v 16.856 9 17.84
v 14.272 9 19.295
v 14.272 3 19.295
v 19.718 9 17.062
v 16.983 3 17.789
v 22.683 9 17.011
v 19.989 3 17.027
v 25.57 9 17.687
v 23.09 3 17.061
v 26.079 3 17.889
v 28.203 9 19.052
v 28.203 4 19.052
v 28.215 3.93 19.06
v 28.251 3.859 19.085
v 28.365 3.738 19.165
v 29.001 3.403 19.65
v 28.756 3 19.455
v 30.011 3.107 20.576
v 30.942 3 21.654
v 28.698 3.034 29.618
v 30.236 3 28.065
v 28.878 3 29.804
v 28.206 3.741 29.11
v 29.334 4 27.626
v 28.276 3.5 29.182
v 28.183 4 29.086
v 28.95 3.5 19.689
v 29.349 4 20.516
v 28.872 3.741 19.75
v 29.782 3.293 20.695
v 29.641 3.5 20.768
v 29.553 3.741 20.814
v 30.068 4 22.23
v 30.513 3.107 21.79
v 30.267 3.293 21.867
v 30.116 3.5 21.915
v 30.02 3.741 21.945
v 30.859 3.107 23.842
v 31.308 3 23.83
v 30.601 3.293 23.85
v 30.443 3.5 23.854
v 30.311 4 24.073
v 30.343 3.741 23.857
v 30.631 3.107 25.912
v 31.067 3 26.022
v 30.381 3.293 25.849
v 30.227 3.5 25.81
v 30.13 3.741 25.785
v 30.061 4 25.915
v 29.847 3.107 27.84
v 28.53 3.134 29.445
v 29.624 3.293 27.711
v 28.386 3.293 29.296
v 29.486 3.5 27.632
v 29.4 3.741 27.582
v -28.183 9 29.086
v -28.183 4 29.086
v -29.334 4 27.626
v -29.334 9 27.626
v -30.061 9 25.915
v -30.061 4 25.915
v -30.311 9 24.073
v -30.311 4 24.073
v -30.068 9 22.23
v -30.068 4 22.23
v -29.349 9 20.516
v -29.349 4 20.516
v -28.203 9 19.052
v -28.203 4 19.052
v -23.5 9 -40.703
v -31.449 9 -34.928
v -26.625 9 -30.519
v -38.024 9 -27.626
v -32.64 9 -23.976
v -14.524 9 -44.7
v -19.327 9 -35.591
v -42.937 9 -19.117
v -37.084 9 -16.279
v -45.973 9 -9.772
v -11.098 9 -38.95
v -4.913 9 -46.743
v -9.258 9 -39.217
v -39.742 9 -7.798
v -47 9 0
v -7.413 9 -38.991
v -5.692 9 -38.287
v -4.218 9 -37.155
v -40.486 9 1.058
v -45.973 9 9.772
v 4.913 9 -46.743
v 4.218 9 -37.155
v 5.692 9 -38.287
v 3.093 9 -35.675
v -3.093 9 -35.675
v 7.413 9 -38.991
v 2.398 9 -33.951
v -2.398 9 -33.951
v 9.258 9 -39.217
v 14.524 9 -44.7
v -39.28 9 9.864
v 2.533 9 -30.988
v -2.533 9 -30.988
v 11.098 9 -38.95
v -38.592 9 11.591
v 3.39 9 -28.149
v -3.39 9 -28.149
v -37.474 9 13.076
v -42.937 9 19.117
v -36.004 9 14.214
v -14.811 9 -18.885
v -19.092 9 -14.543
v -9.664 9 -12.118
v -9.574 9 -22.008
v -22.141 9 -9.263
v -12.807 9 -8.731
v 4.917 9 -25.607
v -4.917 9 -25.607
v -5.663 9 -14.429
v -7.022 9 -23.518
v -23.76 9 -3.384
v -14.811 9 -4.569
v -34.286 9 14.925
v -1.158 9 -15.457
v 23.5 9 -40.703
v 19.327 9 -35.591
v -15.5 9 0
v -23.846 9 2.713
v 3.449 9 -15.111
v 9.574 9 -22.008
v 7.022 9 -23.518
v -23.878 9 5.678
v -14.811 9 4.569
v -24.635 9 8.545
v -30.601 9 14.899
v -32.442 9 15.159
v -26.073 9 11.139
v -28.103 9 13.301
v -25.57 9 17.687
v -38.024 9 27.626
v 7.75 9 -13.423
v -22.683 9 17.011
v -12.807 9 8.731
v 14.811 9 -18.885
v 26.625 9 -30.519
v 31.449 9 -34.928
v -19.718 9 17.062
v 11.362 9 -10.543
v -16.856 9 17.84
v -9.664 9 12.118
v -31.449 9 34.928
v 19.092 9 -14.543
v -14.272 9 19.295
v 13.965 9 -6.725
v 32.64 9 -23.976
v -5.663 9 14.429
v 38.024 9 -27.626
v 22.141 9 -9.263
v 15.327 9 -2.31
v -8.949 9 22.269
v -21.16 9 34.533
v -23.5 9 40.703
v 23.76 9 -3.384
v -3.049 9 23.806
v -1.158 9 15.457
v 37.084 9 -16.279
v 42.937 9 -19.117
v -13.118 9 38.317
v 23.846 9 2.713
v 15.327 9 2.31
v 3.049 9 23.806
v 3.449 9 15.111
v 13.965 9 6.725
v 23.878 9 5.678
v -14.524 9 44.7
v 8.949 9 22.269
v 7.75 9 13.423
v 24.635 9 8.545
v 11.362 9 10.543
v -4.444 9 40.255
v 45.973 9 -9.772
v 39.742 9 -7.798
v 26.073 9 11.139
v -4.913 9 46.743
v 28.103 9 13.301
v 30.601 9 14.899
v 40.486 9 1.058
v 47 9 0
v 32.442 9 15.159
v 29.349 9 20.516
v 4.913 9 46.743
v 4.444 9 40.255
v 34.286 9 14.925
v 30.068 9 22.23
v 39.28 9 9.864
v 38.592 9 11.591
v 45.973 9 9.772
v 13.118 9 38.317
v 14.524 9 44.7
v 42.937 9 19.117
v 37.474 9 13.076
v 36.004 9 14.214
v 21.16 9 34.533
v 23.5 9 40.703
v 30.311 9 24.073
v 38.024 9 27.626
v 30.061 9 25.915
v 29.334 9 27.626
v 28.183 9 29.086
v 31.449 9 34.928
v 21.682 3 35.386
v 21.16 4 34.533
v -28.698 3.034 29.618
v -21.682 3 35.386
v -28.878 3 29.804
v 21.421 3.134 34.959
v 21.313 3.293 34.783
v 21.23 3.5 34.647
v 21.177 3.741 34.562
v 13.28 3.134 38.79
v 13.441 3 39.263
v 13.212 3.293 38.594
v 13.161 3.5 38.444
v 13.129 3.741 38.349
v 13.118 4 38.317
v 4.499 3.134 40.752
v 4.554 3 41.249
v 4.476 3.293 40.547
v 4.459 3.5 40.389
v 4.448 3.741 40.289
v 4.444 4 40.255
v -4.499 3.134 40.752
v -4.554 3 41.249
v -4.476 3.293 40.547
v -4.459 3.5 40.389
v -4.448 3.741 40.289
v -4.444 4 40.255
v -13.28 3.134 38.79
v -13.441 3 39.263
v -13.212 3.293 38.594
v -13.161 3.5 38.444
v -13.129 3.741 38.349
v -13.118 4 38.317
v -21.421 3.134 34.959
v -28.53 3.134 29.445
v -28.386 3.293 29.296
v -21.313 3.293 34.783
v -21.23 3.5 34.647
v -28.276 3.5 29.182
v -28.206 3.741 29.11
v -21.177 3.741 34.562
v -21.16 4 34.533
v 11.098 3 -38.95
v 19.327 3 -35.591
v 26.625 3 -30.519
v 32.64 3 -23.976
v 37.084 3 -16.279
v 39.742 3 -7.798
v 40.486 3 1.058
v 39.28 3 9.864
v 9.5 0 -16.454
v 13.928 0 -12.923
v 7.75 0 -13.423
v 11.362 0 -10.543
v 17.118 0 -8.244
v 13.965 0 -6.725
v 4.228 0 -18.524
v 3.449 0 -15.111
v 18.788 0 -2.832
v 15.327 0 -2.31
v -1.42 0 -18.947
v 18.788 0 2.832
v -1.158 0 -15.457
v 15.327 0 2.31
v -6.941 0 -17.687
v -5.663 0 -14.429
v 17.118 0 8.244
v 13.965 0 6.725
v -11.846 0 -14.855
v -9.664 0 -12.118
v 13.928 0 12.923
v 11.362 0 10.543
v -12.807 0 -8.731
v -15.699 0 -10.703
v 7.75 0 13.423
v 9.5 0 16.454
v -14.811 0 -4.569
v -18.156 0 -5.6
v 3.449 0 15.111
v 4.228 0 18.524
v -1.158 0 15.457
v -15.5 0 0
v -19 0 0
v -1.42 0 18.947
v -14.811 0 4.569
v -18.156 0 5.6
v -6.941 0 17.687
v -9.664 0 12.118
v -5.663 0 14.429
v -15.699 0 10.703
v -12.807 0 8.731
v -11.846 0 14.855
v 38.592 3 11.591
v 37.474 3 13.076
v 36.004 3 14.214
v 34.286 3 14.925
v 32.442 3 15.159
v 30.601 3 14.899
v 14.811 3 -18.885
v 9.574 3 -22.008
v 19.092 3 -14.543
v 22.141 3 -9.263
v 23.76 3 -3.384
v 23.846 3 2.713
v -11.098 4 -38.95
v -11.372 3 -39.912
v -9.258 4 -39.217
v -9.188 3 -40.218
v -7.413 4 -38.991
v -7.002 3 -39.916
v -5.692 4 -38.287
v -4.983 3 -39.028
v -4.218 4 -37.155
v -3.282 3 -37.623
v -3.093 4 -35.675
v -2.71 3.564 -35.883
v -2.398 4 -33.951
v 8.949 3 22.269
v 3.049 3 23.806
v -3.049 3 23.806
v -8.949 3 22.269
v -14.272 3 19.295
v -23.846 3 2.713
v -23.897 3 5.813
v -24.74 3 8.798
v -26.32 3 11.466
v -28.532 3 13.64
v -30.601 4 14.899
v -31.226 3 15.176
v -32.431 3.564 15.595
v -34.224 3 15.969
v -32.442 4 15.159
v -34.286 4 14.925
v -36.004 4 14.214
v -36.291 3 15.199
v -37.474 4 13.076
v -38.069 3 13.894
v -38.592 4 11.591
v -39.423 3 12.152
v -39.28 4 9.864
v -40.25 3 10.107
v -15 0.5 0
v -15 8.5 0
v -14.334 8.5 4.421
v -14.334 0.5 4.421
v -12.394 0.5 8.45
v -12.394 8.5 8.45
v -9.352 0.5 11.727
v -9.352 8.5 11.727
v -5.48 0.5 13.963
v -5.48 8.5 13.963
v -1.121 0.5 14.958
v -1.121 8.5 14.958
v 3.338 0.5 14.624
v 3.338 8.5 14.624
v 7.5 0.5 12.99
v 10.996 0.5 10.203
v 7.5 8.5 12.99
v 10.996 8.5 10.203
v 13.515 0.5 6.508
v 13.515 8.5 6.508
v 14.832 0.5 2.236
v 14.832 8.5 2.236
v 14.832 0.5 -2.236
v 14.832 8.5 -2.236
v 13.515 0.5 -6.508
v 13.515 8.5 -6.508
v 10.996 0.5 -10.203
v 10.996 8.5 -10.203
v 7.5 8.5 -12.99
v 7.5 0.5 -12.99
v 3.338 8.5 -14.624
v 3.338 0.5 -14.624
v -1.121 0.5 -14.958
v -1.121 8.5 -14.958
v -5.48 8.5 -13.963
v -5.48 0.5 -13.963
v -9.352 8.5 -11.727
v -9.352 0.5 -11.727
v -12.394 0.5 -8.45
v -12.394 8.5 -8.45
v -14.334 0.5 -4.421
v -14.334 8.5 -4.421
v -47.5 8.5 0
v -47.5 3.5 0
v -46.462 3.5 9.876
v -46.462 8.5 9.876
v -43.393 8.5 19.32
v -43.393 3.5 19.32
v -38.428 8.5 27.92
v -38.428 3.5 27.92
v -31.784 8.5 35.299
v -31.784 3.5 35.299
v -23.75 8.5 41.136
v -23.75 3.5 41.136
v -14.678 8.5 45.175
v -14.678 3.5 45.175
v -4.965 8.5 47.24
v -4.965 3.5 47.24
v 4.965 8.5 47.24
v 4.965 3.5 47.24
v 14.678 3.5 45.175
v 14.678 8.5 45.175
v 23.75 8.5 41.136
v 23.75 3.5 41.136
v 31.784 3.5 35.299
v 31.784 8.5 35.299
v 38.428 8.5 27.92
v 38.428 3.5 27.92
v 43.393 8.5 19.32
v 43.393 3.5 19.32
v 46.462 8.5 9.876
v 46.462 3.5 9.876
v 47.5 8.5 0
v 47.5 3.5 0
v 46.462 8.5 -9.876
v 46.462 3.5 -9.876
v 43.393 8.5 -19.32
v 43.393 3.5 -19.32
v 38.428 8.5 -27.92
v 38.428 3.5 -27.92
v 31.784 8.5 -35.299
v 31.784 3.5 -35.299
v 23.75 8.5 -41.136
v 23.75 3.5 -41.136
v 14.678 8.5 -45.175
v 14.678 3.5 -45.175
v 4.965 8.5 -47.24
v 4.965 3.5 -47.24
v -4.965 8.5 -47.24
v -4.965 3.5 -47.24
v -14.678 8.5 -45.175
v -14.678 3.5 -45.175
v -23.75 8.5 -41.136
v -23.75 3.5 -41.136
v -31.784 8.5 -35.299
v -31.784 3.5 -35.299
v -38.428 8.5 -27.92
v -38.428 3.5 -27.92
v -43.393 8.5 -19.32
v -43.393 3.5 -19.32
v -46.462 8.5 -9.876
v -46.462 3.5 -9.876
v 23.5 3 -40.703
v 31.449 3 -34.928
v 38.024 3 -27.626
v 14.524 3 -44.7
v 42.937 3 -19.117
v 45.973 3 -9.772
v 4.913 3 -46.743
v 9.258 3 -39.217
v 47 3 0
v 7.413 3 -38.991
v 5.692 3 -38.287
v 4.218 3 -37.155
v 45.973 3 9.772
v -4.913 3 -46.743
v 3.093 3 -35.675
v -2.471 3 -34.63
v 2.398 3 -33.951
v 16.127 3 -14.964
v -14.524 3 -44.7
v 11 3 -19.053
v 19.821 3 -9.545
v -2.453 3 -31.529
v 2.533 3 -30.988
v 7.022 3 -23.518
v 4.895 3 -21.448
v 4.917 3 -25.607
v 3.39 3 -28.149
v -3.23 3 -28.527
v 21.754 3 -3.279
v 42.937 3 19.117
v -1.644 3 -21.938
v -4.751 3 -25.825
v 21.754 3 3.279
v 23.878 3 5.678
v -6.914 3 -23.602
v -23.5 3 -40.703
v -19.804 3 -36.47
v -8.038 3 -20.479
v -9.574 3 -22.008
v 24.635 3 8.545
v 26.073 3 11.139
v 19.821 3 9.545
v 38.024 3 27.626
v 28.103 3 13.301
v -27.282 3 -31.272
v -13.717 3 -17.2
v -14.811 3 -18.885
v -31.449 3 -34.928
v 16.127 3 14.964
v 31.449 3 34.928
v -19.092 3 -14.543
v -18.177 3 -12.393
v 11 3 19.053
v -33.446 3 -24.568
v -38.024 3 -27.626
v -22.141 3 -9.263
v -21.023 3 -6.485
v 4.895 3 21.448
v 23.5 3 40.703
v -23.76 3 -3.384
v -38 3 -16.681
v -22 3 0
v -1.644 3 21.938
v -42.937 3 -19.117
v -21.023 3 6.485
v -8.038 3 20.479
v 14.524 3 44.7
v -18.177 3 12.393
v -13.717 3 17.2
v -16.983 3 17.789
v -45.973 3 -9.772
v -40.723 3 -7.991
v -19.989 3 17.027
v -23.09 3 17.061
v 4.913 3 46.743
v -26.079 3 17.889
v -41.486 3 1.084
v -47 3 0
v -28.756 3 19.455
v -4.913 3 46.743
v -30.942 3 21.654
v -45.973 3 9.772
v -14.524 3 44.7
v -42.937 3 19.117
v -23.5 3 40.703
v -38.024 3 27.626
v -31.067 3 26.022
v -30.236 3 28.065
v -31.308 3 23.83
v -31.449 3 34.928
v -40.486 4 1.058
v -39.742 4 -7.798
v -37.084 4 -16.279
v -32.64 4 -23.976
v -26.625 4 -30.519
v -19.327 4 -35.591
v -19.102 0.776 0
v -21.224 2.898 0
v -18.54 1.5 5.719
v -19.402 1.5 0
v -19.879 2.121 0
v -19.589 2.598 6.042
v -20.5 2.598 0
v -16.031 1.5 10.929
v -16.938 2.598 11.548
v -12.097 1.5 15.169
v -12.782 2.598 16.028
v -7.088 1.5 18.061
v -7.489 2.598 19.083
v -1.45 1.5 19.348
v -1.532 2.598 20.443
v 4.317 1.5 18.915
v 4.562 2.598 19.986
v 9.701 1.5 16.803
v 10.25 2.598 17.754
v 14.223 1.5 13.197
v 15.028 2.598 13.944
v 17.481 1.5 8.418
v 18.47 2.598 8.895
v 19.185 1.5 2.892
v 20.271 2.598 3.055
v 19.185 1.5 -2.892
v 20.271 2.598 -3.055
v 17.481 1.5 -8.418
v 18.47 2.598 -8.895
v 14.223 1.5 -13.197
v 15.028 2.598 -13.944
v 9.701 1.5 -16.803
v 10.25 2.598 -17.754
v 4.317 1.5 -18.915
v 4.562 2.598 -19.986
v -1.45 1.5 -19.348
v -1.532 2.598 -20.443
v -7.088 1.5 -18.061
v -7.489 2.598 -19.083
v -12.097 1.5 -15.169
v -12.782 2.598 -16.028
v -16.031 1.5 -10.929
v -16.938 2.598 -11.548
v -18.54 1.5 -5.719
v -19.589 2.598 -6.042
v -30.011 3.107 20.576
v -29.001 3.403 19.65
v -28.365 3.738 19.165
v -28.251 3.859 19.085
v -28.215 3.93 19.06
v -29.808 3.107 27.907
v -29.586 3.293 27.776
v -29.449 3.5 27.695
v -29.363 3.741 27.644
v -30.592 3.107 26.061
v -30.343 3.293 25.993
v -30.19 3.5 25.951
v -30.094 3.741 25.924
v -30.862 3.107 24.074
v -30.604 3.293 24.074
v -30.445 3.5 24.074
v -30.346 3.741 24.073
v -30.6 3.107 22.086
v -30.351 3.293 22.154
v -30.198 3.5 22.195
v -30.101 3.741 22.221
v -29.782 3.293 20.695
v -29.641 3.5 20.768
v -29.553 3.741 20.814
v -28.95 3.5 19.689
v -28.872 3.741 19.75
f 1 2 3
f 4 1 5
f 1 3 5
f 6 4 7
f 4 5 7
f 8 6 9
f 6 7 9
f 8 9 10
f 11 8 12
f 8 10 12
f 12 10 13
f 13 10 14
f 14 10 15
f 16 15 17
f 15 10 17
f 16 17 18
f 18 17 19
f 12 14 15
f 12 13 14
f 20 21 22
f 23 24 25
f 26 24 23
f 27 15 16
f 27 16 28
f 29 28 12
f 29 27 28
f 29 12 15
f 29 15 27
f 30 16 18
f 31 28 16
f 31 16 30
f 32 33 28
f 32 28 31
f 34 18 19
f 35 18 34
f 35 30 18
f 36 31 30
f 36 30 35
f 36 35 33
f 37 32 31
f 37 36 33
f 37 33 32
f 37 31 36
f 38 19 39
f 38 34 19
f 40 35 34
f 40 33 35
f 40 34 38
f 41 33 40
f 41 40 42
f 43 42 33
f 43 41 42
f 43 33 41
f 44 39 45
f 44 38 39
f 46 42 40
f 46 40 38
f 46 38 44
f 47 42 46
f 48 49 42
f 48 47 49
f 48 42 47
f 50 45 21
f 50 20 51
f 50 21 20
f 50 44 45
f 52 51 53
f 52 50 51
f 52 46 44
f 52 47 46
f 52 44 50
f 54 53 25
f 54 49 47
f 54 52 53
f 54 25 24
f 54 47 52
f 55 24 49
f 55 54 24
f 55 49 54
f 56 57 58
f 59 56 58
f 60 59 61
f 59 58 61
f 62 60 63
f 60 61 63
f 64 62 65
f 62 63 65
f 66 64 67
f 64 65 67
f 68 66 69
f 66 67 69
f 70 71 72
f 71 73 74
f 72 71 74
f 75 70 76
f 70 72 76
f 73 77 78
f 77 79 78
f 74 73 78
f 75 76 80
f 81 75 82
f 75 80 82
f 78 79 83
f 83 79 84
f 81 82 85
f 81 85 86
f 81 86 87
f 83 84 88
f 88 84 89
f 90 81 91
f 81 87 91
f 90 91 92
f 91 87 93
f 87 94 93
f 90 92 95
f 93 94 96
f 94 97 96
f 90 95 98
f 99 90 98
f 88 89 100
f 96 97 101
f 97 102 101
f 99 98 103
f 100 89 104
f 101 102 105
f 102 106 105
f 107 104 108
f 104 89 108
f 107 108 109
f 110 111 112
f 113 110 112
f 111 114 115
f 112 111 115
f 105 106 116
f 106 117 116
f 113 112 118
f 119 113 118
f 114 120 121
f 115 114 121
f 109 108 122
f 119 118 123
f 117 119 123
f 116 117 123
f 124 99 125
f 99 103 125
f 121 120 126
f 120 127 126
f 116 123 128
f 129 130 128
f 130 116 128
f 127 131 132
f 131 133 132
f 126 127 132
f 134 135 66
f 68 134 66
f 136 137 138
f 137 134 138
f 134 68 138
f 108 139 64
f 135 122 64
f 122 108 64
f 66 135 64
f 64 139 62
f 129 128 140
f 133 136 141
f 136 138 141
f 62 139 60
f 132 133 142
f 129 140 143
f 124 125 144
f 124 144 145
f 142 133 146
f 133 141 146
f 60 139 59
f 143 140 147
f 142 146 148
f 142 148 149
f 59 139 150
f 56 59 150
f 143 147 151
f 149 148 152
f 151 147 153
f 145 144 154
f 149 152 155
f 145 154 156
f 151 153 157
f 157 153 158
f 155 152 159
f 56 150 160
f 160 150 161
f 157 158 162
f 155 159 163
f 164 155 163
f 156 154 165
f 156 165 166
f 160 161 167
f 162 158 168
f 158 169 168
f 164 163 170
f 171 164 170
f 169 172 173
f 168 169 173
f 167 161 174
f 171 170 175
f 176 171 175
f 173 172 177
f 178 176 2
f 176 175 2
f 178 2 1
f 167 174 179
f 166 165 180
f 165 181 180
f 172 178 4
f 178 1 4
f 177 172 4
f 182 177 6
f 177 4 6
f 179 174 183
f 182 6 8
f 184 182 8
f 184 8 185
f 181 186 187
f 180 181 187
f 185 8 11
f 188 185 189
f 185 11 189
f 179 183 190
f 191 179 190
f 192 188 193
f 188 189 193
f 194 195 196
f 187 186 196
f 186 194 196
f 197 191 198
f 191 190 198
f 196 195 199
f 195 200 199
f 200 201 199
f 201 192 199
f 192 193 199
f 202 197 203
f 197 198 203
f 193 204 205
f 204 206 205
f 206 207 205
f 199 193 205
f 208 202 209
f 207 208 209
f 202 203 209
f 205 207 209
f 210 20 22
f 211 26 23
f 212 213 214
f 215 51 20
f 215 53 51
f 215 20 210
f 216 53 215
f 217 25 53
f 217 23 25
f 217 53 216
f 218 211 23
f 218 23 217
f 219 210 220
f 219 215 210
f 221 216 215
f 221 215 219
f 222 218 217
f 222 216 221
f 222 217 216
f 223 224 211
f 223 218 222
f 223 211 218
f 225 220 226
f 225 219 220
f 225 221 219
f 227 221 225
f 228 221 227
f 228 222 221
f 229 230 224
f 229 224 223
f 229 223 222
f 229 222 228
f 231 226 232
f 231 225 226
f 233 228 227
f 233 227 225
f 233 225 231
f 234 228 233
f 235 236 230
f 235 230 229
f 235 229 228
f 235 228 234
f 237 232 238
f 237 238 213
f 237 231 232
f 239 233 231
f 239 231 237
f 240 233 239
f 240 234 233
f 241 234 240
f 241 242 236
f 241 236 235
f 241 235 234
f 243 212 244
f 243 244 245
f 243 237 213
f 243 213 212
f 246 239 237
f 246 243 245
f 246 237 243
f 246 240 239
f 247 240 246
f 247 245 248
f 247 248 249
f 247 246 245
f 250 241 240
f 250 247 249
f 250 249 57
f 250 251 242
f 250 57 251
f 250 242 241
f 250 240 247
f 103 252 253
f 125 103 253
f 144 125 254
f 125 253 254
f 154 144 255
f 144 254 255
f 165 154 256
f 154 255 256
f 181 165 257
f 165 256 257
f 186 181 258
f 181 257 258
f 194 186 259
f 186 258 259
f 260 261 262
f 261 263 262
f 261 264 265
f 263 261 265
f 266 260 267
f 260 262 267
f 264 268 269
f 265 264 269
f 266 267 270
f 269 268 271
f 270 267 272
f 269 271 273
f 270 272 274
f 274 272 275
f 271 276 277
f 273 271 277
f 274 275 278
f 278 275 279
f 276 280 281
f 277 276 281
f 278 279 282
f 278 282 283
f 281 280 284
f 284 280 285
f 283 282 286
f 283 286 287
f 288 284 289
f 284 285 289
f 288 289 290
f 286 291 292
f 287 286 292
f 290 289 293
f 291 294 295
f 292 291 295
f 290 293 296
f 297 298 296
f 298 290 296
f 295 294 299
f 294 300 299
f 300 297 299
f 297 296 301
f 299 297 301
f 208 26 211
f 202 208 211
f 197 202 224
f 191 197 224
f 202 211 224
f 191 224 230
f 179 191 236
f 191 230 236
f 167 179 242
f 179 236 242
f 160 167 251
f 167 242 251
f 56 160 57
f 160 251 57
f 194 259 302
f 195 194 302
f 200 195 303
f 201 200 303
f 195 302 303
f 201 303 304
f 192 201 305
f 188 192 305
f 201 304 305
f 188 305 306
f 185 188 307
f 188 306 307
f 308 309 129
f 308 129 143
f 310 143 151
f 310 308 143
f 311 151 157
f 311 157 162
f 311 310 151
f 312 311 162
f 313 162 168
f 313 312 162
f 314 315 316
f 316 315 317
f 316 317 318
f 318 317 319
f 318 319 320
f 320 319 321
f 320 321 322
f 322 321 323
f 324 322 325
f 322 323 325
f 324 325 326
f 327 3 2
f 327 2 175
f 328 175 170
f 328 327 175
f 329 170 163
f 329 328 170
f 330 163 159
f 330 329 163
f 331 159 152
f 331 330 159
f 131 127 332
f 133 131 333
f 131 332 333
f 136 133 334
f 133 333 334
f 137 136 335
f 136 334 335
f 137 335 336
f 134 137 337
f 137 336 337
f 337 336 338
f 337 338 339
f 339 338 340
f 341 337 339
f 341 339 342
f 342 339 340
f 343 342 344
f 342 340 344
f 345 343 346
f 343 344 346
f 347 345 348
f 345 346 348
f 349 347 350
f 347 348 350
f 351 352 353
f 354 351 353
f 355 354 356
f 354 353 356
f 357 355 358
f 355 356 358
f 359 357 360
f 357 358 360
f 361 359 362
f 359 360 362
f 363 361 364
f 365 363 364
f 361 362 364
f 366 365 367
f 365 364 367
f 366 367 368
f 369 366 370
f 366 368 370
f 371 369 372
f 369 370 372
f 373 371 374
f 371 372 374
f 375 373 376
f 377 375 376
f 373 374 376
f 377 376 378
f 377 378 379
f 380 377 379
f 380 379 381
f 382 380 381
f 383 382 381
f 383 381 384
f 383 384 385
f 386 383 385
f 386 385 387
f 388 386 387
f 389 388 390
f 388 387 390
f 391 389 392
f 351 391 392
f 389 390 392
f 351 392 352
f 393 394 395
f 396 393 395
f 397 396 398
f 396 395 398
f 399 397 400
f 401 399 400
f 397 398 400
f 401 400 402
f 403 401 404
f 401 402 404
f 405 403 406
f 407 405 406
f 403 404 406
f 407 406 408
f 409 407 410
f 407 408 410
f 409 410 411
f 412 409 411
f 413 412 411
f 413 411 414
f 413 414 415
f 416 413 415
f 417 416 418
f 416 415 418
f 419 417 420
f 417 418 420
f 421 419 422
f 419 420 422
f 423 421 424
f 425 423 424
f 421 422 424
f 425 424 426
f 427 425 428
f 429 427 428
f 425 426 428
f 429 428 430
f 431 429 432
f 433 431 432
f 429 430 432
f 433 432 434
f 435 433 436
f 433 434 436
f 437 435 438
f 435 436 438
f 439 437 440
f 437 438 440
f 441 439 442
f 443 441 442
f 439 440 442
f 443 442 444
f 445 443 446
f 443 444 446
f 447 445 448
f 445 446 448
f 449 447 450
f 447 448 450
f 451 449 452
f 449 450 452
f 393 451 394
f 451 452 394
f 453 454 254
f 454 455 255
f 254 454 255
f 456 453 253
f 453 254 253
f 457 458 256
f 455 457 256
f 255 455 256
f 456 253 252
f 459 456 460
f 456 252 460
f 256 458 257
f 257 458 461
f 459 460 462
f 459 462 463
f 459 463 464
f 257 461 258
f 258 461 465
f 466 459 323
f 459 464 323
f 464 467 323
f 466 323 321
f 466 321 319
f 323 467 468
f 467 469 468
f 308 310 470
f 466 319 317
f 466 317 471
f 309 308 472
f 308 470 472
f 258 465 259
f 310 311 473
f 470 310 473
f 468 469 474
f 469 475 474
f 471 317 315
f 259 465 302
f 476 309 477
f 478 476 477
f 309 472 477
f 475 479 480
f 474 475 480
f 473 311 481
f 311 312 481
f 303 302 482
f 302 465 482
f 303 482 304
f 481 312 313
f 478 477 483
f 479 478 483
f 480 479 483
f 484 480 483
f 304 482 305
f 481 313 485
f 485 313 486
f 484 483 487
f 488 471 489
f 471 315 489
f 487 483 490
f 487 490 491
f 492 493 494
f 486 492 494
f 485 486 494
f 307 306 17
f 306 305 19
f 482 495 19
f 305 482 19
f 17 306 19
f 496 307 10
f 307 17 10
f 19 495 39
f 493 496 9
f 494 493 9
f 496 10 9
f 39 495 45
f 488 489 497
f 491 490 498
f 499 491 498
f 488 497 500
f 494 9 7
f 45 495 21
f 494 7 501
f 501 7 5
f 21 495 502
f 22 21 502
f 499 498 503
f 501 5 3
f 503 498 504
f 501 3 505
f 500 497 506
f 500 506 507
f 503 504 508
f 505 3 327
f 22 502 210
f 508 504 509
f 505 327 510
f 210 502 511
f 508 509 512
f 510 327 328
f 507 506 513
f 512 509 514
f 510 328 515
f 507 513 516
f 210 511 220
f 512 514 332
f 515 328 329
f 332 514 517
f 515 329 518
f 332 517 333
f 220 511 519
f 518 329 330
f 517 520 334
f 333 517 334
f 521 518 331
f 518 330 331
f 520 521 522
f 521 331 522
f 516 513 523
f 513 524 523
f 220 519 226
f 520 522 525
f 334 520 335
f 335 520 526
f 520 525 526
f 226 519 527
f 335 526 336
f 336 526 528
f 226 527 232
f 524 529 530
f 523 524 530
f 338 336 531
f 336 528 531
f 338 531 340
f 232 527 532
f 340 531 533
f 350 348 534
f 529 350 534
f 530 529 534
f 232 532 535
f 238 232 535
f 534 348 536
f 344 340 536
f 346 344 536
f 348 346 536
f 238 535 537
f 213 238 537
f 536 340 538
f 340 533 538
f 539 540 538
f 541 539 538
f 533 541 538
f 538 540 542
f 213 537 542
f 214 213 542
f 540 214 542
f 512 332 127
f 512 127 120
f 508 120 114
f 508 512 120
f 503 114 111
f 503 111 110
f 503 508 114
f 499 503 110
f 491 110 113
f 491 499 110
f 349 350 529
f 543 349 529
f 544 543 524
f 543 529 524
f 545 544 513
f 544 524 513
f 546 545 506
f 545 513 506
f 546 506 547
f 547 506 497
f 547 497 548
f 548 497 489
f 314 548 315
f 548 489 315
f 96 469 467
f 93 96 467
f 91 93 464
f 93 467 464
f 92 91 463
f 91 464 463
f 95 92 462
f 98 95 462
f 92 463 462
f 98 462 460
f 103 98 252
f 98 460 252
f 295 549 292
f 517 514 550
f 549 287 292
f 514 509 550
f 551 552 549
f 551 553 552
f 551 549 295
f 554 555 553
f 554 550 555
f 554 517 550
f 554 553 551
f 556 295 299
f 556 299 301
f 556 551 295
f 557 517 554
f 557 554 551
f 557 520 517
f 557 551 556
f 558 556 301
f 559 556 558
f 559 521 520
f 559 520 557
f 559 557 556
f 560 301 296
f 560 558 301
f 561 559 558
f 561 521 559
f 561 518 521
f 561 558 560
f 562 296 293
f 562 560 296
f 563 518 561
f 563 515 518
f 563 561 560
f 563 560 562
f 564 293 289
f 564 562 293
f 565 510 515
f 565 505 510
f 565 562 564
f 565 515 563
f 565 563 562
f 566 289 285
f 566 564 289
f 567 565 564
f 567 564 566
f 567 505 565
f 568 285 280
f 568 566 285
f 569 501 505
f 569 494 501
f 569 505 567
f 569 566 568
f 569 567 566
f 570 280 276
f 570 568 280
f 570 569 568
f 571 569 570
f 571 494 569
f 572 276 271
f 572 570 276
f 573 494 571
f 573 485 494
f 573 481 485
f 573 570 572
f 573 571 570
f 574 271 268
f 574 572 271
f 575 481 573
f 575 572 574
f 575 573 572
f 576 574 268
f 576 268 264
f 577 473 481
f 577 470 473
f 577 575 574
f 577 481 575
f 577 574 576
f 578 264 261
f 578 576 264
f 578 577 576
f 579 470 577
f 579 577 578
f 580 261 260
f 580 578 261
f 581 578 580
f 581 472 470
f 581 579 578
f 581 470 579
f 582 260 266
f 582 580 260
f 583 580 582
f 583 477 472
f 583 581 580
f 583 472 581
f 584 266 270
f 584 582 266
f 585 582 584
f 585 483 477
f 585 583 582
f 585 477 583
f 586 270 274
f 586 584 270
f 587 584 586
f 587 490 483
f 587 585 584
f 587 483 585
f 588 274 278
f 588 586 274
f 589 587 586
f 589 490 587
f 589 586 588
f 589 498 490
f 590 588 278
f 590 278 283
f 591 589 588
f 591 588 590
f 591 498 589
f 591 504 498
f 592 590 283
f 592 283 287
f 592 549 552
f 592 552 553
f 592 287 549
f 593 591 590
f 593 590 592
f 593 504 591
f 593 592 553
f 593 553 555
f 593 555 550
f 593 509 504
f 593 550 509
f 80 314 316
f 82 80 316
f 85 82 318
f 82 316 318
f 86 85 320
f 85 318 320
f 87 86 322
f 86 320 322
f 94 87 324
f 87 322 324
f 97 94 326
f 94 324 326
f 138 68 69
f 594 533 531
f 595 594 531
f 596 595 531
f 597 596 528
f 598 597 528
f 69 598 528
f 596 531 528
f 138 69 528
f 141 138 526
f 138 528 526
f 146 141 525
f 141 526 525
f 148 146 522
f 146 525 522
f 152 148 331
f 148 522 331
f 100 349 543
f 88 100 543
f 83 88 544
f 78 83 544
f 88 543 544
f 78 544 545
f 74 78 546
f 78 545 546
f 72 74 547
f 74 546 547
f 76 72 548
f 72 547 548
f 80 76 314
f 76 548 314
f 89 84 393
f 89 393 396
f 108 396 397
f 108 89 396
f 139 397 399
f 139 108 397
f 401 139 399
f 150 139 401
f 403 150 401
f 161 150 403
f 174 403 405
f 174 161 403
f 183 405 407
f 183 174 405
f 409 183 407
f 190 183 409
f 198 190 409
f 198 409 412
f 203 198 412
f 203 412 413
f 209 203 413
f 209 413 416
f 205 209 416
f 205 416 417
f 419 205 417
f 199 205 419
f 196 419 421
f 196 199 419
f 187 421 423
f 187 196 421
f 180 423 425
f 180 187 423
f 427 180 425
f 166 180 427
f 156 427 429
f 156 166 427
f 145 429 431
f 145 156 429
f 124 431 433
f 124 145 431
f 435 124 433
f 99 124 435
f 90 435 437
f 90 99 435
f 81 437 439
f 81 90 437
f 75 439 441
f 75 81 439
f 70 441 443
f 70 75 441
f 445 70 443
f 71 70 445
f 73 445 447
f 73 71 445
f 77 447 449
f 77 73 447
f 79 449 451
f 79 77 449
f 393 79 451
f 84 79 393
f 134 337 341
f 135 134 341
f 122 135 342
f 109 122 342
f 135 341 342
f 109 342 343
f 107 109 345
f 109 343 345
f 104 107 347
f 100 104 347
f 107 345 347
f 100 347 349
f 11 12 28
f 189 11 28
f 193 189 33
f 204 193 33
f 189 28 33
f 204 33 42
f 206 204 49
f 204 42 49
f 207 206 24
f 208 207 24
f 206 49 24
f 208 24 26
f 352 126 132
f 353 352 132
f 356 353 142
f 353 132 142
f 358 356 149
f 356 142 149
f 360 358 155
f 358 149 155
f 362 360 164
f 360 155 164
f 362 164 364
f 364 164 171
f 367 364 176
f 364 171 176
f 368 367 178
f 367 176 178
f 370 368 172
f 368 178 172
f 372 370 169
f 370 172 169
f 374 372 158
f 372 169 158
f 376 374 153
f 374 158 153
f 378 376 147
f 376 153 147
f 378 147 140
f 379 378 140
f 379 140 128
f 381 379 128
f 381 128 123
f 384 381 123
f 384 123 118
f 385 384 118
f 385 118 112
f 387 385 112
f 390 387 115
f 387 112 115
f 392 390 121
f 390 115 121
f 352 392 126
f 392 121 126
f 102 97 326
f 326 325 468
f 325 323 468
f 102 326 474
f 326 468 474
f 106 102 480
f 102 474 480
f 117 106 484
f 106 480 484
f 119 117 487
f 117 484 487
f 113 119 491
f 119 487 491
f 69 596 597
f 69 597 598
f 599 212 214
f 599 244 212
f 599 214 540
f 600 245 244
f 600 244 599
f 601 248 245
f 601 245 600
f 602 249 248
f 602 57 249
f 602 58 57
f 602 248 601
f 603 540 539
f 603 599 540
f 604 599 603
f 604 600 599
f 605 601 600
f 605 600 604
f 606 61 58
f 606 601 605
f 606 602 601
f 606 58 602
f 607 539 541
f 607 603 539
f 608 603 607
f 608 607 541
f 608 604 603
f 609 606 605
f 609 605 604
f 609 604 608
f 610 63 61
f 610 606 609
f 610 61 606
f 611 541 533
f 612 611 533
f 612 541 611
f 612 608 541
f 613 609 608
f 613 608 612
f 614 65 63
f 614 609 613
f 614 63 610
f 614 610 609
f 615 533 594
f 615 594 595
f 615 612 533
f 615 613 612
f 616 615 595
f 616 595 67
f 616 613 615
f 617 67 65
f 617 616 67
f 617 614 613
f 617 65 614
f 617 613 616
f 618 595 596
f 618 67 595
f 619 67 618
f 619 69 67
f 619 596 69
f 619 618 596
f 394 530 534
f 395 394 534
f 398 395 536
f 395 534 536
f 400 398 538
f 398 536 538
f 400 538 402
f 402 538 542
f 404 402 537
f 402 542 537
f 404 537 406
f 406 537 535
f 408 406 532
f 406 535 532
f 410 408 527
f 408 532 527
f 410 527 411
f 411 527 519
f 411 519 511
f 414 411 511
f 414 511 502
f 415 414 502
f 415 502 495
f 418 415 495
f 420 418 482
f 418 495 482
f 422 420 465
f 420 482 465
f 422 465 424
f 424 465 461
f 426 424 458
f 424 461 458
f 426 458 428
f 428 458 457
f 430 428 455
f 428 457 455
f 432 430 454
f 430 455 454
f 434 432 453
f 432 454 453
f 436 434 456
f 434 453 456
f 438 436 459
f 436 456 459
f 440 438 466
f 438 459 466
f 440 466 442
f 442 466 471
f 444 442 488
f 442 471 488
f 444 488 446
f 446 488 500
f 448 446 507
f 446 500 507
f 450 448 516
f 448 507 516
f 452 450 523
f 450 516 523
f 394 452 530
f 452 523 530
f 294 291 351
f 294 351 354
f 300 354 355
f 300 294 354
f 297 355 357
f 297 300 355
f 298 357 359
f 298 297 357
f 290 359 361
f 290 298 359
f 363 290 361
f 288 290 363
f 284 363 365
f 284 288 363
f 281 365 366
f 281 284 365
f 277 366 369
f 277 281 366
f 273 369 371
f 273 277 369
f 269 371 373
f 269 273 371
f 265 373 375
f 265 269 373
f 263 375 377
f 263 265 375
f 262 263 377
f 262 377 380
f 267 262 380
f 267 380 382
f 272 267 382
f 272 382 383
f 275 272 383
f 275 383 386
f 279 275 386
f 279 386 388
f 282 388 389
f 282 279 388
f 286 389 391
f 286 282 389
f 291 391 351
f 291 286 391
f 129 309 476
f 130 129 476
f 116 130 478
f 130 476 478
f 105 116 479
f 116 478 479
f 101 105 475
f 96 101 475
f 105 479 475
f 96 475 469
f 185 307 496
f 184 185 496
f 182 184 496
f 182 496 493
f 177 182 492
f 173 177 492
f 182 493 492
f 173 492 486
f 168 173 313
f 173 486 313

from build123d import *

# Parameters (mm, degrees)
CHAMFER_SIZE       = 0.5
CHAMFER001_SIZE    = 0.5
CHAMFER002_SIZE    = 0.5
CHAMFER003_SIZE    = 0.5
POCKET_DEPTH       = 275.303804
POLARPATTERN_COUNT = 3
CHAMFER004_SIZE    = 1
FILLET_R           = 1


with BuildPart() as part:
    # Sketch → Revolution (revolve)
    with BuildSketch(Plane.XY):
        with BuildLine():
            Line((-15, 9), (-47.5, 9))
            Line((-47.5, 9), (-47.5, 3))
            Line((-47.5, 3), (-22, 3))
            ThreePointArc((-19, 0), (-19.87868, 2.12132), (-22, 3))
            Line((-19, 0), (-15, 0))
            Line((-15, 0), (-15, 9))
        make_face()
    revolve(axis=Axis((0, 0, 0), (0, 1, 0)))

    # Chamfer
    chamfer_edges = [part.edges().sort_by_distance(p)[0] for p in [
        (47.5, 3, 0),
    ]]
    chamfer(chamfer_edges, length=CHAMFER_SIZE)

    # Chamfer001
    chamfer001_edges = [part.edges().sort_by_distance(p)[0] for p in [
        (47.5, 9, 0),
    ]]
    chamfer(chamfer001_edges, length=CHAMFER001_SIZE)

    # Chamfer002
    chamfer002_edges = [part.edges().sort_by_distance(p)[0] for p in [
        (15, 0, 0),
    ]]
    chamfer(chamfer002_edges, length=CHAMFER002_SIZE)

    # Chamfer003
    chamfer003_edges = [part.edges().sort_by_distance(p)[0] for p in [
        (15, 9, 0),
    ]]
    chamfer(chamfer003_edges, length=CHAMFER003_SIZE)

    # Sketch001 (on Face9 of Chamfer003) → Pocket (cut, through all)
    with BuildSketch(Plane.XZ.offset(-3)):
        with BuildLine():
            ThreePointArc((28.182522, 29.086001), (0, 40.5), (-28.182522, 29.086001))
            ThreePointArc((-28.182522, 29.086001), (-30.311454, 24.073232), (-28.203222, 19.051721))
            ThreePointArc((-28.203222, 19.051721), (-21.198816, 16.944507), (-14.272296, 19.295118))
            ThreePointArc((14.272296, 19.295118), (0, 24), (-14.272296, 19.295118))
            ThreePointArc((14.272296, 19.295118), (21.198816, 16.944507), (28.203222, 19.051721))
            ThreePointArc((28.203222, 19.051721), (30.311454, 24.073232), (28.182522, 29.086001))
        make_face()
    pocket = extrude(amount=-POCKET_DEPTH, mode=Mode.SUBTRACT)

    # PolarPattern: Pocket ×3 about axis
    polarpattern_axis = Axis((0, 3, 0), (0, -1, 0))
    for i in range(1, POLARPATTERN_COUNT):
        add(pocket.rotate(polarpattern_axis, i * 360 / POLARPATTERN_COUNT), mode=Mode.SUBTRACT)

    # Chamfer004
    chamfer004_edges = [part.edges().sort_by_distance(p)[0] for p in [
        (-35.074029, 3, -20.25),
    ]]
    chamfer(chamfer004_edges, length=CHAMFER004_SIZE)

    # Fillet
    fillet_edges = [part.edges().sort_by_distance(p)[0] for p in [
        (0, 3, 40.5),
    ]]
    fillet(fillet_edges, radius=FILLET_R)


solid = part.part
